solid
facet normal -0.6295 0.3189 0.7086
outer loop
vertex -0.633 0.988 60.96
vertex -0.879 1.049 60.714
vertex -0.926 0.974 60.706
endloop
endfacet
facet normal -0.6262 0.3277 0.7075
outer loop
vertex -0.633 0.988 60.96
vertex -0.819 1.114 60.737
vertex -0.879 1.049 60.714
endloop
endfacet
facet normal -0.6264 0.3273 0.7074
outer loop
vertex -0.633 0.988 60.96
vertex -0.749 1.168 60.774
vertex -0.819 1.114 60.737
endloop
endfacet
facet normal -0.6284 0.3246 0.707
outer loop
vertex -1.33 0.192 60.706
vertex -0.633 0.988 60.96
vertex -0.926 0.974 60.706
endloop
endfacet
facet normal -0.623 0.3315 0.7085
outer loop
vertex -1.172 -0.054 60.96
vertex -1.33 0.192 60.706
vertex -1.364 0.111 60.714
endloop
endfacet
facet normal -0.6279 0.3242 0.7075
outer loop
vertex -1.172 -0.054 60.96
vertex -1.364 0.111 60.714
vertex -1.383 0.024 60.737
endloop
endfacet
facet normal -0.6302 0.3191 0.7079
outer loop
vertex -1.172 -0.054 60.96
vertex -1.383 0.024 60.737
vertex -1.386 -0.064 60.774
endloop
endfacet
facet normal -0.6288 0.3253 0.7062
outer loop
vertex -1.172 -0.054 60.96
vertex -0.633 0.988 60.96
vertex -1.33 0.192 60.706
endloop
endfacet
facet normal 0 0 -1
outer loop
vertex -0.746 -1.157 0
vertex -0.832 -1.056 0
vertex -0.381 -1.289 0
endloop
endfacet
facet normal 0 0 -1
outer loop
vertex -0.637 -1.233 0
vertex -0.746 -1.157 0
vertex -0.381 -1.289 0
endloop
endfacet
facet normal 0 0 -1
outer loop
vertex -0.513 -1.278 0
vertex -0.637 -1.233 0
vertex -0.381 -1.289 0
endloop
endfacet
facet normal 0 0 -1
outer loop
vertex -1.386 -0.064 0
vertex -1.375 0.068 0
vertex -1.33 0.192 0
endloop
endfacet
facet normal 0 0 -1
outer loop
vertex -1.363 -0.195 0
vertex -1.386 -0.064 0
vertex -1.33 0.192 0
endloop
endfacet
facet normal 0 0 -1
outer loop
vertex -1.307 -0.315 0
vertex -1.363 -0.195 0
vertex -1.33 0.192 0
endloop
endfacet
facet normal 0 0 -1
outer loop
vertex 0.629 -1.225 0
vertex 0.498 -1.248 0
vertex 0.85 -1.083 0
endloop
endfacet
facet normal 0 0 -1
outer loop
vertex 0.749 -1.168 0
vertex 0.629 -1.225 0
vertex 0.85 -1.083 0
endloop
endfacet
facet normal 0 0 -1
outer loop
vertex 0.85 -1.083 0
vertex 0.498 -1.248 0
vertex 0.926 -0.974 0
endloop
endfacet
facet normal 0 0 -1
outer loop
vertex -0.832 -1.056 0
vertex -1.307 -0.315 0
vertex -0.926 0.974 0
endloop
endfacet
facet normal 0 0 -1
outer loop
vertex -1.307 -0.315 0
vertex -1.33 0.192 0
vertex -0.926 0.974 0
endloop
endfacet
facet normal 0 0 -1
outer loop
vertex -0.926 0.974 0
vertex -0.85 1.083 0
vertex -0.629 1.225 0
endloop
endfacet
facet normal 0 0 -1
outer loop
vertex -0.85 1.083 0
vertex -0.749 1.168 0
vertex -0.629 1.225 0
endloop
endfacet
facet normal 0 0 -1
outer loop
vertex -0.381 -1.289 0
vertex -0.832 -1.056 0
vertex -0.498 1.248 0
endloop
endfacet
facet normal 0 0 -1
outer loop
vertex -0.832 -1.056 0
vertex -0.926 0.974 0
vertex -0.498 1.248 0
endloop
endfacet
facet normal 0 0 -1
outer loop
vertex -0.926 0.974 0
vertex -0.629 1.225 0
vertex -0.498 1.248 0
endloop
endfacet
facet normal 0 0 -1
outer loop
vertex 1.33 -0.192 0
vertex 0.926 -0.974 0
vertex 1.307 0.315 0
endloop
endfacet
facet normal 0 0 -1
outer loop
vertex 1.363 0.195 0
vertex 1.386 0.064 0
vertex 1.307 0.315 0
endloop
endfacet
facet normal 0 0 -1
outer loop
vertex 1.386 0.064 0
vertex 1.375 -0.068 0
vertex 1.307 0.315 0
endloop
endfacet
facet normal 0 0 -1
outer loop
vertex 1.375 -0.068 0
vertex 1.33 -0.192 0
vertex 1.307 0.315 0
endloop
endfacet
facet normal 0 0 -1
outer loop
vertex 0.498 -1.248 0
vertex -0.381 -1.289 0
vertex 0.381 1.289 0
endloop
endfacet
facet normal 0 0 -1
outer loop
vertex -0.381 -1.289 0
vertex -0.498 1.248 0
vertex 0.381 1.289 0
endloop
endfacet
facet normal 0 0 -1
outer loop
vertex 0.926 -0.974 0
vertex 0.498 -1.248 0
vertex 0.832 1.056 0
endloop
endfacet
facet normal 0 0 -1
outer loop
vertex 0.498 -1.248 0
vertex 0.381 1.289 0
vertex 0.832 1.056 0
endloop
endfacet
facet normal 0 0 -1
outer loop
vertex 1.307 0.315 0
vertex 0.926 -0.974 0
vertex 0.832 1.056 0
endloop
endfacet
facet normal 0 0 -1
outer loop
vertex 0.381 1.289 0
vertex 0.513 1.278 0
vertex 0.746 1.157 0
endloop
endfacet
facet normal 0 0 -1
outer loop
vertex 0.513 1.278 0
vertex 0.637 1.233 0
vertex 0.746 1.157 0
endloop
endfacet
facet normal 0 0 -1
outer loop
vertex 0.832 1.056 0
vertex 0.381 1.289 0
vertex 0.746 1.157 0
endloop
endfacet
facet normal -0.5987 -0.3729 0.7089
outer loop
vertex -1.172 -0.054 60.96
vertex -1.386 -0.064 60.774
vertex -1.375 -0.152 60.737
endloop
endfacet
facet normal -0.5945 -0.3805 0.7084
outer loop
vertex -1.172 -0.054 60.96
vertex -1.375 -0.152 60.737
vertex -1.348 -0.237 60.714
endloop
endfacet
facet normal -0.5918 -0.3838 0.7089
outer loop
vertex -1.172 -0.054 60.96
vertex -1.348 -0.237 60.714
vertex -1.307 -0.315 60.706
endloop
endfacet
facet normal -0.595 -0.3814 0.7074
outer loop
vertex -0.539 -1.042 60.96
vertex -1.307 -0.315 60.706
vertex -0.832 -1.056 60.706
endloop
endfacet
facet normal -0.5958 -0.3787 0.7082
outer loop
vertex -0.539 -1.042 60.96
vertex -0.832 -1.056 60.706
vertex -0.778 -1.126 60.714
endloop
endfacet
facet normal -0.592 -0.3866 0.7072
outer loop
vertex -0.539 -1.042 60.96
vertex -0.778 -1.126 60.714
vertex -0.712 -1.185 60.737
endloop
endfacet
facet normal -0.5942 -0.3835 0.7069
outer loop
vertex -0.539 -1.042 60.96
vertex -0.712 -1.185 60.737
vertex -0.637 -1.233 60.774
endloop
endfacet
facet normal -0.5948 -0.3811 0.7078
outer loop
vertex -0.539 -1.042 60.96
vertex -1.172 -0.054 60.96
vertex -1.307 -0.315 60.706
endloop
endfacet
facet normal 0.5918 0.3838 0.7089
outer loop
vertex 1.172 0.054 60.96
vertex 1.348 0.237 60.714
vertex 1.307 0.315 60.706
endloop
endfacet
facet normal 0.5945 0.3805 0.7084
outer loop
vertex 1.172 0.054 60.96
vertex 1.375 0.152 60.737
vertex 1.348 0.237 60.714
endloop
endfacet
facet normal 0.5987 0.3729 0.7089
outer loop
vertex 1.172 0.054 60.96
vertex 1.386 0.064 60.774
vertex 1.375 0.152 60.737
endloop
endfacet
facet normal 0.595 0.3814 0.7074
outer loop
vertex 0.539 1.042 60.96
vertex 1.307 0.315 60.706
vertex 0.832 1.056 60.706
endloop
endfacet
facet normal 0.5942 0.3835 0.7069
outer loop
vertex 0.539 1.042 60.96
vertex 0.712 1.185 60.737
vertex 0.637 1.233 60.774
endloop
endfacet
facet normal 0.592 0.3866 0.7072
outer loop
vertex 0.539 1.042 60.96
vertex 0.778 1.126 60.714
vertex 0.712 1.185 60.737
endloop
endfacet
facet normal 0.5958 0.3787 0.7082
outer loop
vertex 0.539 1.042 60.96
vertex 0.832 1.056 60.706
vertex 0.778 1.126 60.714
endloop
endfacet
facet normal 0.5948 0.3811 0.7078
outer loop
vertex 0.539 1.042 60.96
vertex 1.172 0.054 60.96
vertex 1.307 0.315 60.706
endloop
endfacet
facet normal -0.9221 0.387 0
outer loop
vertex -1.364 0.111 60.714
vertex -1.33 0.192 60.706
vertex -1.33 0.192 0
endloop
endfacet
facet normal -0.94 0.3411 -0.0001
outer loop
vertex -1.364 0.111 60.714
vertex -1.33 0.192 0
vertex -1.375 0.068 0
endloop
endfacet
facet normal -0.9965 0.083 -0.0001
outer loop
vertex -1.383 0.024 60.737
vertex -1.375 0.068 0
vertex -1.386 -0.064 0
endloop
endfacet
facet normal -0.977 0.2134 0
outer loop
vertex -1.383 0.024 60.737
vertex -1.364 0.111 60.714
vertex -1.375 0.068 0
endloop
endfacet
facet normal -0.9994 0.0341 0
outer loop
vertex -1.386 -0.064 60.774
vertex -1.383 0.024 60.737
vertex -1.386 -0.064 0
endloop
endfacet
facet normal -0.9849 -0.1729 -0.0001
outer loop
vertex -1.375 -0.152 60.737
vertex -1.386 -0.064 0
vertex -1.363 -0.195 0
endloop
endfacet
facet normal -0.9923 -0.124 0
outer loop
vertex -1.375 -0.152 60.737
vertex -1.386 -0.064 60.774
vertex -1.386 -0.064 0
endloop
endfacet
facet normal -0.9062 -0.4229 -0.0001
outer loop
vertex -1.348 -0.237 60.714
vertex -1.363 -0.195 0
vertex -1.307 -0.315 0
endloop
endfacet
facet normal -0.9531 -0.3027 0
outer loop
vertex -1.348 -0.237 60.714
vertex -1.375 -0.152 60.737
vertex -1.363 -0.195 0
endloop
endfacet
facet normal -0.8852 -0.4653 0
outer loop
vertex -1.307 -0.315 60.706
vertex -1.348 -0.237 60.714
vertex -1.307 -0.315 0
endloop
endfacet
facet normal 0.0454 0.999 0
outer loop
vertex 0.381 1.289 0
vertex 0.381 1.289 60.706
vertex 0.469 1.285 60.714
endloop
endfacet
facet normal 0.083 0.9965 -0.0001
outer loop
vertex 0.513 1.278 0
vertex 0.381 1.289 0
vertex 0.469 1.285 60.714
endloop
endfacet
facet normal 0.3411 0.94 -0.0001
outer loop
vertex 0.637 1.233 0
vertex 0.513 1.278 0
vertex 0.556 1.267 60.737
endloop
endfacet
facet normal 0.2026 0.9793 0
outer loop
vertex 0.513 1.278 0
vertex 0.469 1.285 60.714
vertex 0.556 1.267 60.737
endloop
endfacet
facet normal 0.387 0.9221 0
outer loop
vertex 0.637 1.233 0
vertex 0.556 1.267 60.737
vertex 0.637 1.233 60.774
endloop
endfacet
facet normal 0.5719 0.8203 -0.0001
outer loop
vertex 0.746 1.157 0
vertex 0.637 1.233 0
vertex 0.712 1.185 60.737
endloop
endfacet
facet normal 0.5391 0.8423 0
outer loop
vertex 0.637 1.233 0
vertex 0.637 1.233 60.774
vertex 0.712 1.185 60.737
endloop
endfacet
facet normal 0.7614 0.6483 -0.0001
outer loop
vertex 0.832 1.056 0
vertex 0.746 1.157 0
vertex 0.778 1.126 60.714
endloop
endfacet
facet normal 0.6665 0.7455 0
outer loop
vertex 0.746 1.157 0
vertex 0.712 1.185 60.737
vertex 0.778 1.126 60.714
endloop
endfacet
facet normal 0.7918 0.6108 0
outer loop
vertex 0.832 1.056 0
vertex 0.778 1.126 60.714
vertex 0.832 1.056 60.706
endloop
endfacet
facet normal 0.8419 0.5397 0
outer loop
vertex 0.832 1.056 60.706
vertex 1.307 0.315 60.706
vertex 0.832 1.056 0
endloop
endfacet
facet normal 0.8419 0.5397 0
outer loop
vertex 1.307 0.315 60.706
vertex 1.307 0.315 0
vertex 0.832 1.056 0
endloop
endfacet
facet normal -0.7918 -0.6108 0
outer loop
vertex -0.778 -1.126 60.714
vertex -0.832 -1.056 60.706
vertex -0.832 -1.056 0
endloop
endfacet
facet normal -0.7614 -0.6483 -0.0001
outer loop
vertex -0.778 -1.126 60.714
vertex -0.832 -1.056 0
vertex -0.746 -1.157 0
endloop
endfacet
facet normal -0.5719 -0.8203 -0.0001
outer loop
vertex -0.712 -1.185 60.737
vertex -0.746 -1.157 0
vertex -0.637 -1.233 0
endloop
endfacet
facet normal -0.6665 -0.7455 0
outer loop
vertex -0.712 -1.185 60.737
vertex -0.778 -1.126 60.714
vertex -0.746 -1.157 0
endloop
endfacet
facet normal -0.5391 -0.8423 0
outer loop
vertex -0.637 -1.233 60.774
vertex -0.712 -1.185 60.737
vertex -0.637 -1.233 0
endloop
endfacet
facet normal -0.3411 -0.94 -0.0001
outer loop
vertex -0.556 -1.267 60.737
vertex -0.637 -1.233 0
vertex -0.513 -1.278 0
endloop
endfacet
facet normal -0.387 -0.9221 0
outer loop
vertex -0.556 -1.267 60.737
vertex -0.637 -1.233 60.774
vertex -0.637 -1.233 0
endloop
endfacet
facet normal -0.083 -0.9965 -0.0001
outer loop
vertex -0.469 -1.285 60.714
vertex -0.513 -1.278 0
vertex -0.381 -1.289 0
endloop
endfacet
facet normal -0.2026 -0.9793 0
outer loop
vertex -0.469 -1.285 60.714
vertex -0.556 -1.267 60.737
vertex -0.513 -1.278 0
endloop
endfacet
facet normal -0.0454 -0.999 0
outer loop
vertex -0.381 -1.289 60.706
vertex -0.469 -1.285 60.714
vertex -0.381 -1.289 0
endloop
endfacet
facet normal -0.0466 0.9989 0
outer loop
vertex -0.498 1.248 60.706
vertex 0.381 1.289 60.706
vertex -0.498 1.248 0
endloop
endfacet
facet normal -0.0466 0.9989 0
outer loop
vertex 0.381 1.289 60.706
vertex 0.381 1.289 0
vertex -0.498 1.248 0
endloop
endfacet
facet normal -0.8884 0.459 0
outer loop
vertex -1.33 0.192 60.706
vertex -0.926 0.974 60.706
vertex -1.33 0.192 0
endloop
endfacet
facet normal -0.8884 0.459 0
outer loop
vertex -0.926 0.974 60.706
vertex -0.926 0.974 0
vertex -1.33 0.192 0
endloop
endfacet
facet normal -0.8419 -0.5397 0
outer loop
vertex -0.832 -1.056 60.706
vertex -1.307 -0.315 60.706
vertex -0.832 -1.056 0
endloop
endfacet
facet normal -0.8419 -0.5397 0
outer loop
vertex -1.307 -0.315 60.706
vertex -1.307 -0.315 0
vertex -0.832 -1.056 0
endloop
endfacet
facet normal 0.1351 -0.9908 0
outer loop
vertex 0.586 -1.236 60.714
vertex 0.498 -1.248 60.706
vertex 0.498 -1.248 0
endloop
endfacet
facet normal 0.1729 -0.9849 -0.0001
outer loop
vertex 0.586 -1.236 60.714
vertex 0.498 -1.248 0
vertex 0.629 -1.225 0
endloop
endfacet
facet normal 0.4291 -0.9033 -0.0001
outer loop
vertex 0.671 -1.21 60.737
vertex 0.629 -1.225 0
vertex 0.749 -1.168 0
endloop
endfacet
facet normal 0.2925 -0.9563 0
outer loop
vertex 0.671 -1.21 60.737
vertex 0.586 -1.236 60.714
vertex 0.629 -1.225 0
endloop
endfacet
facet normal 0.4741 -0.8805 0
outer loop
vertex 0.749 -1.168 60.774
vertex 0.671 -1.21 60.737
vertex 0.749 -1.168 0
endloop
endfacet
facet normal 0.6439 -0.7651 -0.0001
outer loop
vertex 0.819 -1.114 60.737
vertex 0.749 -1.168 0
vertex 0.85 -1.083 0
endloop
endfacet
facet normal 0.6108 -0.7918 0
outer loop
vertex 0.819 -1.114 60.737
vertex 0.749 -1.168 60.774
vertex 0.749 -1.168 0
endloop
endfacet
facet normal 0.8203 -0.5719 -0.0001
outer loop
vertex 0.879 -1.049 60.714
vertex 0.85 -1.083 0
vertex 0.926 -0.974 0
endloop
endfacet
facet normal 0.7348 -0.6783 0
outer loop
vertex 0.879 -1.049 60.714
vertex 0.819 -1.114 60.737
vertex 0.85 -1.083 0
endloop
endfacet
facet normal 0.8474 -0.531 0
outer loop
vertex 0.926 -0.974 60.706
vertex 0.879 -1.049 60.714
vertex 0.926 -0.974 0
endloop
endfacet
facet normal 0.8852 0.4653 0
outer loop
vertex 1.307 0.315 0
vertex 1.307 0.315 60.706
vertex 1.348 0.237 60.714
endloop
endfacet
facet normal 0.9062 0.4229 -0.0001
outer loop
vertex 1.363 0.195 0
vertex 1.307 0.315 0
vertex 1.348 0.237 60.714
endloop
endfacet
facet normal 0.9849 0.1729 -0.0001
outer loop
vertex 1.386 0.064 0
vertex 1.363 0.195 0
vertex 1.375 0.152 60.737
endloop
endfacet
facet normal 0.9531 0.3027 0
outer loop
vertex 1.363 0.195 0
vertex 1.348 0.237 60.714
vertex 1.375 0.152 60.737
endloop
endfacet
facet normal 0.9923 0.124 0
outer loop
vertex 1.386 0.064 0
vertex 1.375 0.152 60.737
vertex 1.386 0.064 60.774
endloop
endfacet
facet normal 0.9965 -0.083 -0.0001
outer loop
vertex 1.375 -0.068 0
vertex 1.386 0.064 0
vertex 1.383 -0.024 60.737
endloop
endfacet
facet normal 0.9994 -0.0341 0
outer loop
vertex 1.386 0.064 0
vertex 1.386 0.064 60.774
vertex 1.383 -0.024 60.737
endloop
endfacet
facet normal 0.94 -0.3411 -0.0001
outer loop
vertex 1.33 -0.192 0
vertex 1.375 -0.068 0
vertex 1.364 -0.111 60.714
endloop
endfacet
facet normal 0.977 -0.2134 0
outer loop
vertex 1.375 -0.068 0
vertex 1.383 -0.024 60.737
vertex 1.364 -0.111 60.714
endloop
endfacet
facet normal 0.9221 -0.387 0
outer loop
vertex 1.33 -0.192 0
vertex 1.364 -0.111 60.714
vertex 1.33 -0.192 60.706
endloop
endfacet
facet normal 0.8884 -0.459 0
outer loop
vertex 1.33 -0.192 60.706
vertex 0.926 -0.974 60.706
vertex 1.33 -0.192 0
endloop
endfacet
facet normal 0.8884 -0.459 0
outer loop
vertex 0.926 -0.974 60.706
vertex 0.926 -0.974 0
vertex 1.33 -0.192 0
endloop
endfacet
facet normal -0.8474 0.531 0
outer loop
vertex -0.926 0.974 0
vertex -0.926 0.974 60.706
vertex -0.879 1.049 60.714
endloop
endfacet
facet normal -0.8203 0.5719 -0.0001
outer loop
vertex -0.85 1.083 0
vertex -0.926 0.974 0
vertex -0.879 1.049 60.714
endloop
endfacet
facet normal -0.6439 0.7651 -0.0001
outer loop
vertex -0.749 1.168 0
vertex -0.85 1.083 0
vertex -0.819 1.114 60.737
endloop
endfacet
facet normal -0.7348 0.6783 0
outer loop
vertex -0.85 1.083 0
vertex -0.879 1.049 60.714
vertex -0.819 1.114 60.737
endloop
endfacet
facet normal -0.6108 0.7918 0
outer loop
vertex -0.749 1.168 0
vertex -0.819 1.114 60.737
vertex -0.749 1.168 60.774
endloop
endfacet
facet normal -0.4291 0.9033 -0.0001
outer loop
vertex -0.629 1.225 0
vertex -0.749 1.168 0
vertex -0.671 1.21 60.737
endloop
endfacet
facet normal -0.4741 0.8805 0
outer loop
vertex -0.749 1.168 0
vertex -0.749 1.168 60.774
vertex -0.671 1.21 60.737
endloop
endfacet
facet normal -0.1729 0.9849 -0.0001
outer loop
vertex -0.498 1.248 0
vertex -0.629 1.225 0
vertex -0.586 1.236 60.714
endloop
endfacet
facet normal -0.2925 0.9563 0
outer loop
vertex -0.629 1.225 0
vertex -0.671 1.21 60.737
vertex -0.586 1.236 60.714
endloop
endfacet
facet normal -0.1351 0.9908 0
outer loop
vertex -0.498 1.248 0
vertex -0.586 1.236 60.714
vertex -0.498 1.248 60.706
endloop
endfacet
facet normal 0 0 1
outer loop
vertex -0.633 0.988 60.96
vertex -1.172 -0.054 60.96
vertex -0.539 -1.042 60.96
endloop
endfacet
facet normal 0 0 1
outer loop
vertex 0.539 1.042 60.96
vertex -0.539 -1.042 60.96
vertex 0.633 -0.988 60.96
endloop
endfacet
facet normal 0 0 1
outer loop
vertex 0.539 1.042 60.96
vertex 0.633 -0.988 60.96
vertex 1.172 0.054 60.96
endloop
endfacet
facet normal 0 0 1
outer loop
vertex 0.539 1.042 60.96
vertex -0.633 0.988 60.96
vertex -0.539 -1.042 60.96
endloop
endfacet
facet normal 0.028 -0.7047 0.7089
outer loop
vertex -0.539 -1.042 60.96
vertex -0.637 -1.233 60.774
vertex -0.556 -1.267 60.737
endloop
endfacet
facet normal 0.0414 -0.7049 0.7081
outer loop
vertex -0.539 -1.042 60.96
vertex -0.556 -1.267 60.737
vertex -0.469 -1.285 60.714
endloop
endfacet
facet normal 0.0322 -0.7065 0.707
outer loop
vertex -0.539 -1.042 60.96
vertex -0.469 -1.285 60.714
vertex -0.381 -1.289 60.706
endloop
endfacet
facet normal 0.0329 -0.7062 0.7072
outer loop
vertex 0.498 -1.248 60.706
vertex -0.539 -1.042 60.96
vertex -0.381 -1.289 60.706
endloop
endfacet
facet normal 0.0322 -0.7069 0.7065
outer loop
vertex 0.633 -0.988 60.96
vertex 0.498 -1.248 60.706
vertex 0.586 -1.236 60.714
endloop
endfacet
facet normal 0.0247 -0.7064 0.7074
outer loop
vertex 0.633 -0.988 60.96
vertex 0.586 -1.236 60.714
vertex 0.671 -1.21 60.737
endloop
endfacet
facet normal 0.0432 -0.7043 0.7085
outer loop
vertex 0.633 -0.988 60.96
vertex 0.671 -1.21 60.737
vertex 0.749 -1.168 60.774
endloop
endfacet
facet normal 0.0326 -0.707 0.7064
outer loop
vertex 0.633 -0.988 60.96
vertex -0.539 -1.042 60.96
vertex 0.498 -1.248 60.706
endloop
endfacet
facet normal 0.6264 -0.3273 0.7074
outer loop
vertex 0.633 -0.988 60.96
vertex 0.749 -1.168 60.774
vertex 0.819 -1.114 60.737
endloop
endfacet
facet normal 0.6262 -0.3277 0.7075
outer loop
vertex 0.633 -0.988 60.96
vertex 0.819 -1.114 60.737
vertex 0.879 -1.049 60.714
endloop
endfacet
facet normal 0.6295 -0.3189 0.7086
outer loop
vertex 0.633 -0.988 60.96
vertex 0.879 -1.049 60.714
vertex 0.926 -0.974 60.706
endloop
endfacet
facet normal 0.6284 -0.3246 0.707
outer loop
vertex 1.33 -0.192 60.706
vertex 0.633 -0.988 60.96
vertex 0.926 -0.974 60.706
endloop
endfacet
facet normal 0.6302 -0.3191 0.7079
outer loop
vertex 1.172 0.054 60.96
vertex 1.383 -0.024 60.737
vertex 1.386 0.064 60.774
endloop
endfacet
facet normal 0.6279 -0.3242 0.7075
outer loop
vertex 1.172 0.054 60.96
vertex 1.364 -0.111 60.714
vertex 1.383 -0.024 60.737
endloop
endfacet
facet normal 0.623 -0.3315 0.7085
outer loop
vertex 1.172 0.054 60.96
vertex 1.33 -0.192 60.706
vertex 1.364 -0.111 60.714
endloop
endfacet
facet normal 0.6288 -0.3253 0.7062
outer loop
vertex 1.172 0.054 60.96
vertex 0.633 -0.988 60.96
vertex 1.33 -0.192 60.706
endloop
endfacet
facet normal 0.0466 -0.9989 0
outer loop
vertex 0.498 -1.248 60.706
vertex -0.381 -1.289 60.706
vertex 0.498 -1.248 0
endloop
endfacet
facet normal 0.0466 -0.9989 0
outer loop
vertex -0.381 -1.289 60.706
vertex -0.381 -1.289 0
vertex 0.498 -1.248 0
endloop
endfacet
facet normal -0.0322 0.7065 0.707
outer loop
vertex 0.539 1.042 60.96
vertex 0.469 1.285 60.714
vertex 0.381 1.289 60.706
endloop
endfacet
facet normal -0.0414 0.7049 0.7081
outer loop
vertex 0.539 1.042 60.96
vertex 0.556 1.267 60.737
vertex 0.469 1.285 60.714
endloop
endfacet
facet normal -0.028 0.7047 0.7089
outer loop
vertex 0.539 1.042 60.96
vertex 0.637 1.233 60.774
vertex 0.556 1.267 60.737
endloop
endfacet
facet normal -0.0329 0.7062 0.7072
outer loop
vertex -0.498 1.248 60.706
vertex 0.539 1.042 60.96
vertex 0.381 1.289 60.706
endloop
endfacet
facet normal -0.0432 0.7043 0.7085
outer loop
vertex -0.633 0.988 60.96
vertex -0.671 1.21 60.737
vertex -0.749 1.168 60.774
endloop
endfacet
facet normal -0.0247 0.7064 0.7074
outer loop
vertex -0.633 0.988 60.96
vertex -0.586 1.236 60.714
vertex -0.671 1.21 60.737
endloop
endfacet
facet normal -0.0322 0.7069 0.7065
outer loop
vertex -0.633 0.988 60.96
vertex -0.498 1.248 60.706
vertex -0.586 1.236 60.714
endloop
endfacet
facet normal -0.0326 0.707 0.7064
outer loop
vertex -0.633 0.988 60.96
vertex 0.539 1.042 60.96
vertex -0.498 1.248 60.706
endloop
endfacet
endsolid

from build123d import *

# Parameters (mm, degrees)
BOSS_EXTRUDE1_DEPTH = 60.96
CHAMFER1_SIZE       = 0.254
FILLET1_R           = 0.508


with BuildPart() as part:
    # Sketch1 → Boss-Extrude1 (new body)
    with BuildSketch(Plane.XY):
        Polygon((-0.791369427, 1.234612394), (-1.464890411, -0.06803983), (-0.673520984, -1.302652224), (0.791369427, -1.234612394), (1.464890411, 0.06803983), (0.673520984, 1.302652224), align=None)
    extrude(amount=BOSS_EXTRUDE1_DEPTH)

    # Chamfer1
    chamfer1_edges = [part.edges().sort_by_distance(p)[0] for p in [
        (-1.069205697, -0.685346027, 60.96),
        (0.058924221, -1.268632309, 60.96),
        (1.128129919, -0.583286282, 60.96),
        (1.069205697, 0.685346027, 60.96),
        (-0.058924221, 1.268632309, 60.96),
        (-1.128129919, 0.583286282, 60.96),
    ]]
    chamfer(chamfer1_edges, length=CHAMFER1_SIZE)

    # Fillet1
    fillet1_edges = [part.edges().sort_by_distance(p)[0] for p in [
        (-0.673520984, -1.302652224, 30.353),
        (-1.464890411, -0.06803983, 30.353),
        (0.791369427, -1.234612394, 30.353),
        (1.464890411, 0.06803983, 30.353),
        (0.673520984, 1.302652224, 30.353),
        (-0.791369427, 1.234612394, 30.353),
    ]]
    fillet(fillet1_edges, radius=FILLET1_R)


solid = part.part
